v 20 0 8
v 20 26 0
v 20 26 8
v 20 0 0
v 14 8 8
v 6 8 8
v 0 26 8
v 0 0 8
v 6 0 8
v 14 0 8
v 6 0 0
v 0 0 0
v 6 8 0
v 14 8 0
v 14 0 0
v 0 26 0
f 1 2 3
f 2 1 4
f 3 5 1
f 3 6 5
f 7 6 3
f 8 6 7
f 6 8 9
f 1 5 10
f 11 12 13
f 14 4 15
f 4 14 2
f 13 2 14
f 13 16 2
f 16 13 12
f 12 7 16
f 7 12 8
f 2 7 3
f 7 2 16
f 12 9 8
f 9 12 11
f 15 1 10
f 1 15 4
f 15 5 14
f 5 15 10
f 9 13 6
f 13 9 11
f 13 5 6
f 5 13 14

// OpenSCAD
module servo_u_holder()
{
	holewidth = 8;
	holeheight = 8;
	partwidth = 20;
	partheight = 26;
	wall = 8;
	
	difference()
	{
		cube([partwidth, partheight, wall]);
		translate([partwidth/2-holewidth/2,0,0])
			cube([holewidth, holeheight, wall]);
	}
}

servo_u_holder();
